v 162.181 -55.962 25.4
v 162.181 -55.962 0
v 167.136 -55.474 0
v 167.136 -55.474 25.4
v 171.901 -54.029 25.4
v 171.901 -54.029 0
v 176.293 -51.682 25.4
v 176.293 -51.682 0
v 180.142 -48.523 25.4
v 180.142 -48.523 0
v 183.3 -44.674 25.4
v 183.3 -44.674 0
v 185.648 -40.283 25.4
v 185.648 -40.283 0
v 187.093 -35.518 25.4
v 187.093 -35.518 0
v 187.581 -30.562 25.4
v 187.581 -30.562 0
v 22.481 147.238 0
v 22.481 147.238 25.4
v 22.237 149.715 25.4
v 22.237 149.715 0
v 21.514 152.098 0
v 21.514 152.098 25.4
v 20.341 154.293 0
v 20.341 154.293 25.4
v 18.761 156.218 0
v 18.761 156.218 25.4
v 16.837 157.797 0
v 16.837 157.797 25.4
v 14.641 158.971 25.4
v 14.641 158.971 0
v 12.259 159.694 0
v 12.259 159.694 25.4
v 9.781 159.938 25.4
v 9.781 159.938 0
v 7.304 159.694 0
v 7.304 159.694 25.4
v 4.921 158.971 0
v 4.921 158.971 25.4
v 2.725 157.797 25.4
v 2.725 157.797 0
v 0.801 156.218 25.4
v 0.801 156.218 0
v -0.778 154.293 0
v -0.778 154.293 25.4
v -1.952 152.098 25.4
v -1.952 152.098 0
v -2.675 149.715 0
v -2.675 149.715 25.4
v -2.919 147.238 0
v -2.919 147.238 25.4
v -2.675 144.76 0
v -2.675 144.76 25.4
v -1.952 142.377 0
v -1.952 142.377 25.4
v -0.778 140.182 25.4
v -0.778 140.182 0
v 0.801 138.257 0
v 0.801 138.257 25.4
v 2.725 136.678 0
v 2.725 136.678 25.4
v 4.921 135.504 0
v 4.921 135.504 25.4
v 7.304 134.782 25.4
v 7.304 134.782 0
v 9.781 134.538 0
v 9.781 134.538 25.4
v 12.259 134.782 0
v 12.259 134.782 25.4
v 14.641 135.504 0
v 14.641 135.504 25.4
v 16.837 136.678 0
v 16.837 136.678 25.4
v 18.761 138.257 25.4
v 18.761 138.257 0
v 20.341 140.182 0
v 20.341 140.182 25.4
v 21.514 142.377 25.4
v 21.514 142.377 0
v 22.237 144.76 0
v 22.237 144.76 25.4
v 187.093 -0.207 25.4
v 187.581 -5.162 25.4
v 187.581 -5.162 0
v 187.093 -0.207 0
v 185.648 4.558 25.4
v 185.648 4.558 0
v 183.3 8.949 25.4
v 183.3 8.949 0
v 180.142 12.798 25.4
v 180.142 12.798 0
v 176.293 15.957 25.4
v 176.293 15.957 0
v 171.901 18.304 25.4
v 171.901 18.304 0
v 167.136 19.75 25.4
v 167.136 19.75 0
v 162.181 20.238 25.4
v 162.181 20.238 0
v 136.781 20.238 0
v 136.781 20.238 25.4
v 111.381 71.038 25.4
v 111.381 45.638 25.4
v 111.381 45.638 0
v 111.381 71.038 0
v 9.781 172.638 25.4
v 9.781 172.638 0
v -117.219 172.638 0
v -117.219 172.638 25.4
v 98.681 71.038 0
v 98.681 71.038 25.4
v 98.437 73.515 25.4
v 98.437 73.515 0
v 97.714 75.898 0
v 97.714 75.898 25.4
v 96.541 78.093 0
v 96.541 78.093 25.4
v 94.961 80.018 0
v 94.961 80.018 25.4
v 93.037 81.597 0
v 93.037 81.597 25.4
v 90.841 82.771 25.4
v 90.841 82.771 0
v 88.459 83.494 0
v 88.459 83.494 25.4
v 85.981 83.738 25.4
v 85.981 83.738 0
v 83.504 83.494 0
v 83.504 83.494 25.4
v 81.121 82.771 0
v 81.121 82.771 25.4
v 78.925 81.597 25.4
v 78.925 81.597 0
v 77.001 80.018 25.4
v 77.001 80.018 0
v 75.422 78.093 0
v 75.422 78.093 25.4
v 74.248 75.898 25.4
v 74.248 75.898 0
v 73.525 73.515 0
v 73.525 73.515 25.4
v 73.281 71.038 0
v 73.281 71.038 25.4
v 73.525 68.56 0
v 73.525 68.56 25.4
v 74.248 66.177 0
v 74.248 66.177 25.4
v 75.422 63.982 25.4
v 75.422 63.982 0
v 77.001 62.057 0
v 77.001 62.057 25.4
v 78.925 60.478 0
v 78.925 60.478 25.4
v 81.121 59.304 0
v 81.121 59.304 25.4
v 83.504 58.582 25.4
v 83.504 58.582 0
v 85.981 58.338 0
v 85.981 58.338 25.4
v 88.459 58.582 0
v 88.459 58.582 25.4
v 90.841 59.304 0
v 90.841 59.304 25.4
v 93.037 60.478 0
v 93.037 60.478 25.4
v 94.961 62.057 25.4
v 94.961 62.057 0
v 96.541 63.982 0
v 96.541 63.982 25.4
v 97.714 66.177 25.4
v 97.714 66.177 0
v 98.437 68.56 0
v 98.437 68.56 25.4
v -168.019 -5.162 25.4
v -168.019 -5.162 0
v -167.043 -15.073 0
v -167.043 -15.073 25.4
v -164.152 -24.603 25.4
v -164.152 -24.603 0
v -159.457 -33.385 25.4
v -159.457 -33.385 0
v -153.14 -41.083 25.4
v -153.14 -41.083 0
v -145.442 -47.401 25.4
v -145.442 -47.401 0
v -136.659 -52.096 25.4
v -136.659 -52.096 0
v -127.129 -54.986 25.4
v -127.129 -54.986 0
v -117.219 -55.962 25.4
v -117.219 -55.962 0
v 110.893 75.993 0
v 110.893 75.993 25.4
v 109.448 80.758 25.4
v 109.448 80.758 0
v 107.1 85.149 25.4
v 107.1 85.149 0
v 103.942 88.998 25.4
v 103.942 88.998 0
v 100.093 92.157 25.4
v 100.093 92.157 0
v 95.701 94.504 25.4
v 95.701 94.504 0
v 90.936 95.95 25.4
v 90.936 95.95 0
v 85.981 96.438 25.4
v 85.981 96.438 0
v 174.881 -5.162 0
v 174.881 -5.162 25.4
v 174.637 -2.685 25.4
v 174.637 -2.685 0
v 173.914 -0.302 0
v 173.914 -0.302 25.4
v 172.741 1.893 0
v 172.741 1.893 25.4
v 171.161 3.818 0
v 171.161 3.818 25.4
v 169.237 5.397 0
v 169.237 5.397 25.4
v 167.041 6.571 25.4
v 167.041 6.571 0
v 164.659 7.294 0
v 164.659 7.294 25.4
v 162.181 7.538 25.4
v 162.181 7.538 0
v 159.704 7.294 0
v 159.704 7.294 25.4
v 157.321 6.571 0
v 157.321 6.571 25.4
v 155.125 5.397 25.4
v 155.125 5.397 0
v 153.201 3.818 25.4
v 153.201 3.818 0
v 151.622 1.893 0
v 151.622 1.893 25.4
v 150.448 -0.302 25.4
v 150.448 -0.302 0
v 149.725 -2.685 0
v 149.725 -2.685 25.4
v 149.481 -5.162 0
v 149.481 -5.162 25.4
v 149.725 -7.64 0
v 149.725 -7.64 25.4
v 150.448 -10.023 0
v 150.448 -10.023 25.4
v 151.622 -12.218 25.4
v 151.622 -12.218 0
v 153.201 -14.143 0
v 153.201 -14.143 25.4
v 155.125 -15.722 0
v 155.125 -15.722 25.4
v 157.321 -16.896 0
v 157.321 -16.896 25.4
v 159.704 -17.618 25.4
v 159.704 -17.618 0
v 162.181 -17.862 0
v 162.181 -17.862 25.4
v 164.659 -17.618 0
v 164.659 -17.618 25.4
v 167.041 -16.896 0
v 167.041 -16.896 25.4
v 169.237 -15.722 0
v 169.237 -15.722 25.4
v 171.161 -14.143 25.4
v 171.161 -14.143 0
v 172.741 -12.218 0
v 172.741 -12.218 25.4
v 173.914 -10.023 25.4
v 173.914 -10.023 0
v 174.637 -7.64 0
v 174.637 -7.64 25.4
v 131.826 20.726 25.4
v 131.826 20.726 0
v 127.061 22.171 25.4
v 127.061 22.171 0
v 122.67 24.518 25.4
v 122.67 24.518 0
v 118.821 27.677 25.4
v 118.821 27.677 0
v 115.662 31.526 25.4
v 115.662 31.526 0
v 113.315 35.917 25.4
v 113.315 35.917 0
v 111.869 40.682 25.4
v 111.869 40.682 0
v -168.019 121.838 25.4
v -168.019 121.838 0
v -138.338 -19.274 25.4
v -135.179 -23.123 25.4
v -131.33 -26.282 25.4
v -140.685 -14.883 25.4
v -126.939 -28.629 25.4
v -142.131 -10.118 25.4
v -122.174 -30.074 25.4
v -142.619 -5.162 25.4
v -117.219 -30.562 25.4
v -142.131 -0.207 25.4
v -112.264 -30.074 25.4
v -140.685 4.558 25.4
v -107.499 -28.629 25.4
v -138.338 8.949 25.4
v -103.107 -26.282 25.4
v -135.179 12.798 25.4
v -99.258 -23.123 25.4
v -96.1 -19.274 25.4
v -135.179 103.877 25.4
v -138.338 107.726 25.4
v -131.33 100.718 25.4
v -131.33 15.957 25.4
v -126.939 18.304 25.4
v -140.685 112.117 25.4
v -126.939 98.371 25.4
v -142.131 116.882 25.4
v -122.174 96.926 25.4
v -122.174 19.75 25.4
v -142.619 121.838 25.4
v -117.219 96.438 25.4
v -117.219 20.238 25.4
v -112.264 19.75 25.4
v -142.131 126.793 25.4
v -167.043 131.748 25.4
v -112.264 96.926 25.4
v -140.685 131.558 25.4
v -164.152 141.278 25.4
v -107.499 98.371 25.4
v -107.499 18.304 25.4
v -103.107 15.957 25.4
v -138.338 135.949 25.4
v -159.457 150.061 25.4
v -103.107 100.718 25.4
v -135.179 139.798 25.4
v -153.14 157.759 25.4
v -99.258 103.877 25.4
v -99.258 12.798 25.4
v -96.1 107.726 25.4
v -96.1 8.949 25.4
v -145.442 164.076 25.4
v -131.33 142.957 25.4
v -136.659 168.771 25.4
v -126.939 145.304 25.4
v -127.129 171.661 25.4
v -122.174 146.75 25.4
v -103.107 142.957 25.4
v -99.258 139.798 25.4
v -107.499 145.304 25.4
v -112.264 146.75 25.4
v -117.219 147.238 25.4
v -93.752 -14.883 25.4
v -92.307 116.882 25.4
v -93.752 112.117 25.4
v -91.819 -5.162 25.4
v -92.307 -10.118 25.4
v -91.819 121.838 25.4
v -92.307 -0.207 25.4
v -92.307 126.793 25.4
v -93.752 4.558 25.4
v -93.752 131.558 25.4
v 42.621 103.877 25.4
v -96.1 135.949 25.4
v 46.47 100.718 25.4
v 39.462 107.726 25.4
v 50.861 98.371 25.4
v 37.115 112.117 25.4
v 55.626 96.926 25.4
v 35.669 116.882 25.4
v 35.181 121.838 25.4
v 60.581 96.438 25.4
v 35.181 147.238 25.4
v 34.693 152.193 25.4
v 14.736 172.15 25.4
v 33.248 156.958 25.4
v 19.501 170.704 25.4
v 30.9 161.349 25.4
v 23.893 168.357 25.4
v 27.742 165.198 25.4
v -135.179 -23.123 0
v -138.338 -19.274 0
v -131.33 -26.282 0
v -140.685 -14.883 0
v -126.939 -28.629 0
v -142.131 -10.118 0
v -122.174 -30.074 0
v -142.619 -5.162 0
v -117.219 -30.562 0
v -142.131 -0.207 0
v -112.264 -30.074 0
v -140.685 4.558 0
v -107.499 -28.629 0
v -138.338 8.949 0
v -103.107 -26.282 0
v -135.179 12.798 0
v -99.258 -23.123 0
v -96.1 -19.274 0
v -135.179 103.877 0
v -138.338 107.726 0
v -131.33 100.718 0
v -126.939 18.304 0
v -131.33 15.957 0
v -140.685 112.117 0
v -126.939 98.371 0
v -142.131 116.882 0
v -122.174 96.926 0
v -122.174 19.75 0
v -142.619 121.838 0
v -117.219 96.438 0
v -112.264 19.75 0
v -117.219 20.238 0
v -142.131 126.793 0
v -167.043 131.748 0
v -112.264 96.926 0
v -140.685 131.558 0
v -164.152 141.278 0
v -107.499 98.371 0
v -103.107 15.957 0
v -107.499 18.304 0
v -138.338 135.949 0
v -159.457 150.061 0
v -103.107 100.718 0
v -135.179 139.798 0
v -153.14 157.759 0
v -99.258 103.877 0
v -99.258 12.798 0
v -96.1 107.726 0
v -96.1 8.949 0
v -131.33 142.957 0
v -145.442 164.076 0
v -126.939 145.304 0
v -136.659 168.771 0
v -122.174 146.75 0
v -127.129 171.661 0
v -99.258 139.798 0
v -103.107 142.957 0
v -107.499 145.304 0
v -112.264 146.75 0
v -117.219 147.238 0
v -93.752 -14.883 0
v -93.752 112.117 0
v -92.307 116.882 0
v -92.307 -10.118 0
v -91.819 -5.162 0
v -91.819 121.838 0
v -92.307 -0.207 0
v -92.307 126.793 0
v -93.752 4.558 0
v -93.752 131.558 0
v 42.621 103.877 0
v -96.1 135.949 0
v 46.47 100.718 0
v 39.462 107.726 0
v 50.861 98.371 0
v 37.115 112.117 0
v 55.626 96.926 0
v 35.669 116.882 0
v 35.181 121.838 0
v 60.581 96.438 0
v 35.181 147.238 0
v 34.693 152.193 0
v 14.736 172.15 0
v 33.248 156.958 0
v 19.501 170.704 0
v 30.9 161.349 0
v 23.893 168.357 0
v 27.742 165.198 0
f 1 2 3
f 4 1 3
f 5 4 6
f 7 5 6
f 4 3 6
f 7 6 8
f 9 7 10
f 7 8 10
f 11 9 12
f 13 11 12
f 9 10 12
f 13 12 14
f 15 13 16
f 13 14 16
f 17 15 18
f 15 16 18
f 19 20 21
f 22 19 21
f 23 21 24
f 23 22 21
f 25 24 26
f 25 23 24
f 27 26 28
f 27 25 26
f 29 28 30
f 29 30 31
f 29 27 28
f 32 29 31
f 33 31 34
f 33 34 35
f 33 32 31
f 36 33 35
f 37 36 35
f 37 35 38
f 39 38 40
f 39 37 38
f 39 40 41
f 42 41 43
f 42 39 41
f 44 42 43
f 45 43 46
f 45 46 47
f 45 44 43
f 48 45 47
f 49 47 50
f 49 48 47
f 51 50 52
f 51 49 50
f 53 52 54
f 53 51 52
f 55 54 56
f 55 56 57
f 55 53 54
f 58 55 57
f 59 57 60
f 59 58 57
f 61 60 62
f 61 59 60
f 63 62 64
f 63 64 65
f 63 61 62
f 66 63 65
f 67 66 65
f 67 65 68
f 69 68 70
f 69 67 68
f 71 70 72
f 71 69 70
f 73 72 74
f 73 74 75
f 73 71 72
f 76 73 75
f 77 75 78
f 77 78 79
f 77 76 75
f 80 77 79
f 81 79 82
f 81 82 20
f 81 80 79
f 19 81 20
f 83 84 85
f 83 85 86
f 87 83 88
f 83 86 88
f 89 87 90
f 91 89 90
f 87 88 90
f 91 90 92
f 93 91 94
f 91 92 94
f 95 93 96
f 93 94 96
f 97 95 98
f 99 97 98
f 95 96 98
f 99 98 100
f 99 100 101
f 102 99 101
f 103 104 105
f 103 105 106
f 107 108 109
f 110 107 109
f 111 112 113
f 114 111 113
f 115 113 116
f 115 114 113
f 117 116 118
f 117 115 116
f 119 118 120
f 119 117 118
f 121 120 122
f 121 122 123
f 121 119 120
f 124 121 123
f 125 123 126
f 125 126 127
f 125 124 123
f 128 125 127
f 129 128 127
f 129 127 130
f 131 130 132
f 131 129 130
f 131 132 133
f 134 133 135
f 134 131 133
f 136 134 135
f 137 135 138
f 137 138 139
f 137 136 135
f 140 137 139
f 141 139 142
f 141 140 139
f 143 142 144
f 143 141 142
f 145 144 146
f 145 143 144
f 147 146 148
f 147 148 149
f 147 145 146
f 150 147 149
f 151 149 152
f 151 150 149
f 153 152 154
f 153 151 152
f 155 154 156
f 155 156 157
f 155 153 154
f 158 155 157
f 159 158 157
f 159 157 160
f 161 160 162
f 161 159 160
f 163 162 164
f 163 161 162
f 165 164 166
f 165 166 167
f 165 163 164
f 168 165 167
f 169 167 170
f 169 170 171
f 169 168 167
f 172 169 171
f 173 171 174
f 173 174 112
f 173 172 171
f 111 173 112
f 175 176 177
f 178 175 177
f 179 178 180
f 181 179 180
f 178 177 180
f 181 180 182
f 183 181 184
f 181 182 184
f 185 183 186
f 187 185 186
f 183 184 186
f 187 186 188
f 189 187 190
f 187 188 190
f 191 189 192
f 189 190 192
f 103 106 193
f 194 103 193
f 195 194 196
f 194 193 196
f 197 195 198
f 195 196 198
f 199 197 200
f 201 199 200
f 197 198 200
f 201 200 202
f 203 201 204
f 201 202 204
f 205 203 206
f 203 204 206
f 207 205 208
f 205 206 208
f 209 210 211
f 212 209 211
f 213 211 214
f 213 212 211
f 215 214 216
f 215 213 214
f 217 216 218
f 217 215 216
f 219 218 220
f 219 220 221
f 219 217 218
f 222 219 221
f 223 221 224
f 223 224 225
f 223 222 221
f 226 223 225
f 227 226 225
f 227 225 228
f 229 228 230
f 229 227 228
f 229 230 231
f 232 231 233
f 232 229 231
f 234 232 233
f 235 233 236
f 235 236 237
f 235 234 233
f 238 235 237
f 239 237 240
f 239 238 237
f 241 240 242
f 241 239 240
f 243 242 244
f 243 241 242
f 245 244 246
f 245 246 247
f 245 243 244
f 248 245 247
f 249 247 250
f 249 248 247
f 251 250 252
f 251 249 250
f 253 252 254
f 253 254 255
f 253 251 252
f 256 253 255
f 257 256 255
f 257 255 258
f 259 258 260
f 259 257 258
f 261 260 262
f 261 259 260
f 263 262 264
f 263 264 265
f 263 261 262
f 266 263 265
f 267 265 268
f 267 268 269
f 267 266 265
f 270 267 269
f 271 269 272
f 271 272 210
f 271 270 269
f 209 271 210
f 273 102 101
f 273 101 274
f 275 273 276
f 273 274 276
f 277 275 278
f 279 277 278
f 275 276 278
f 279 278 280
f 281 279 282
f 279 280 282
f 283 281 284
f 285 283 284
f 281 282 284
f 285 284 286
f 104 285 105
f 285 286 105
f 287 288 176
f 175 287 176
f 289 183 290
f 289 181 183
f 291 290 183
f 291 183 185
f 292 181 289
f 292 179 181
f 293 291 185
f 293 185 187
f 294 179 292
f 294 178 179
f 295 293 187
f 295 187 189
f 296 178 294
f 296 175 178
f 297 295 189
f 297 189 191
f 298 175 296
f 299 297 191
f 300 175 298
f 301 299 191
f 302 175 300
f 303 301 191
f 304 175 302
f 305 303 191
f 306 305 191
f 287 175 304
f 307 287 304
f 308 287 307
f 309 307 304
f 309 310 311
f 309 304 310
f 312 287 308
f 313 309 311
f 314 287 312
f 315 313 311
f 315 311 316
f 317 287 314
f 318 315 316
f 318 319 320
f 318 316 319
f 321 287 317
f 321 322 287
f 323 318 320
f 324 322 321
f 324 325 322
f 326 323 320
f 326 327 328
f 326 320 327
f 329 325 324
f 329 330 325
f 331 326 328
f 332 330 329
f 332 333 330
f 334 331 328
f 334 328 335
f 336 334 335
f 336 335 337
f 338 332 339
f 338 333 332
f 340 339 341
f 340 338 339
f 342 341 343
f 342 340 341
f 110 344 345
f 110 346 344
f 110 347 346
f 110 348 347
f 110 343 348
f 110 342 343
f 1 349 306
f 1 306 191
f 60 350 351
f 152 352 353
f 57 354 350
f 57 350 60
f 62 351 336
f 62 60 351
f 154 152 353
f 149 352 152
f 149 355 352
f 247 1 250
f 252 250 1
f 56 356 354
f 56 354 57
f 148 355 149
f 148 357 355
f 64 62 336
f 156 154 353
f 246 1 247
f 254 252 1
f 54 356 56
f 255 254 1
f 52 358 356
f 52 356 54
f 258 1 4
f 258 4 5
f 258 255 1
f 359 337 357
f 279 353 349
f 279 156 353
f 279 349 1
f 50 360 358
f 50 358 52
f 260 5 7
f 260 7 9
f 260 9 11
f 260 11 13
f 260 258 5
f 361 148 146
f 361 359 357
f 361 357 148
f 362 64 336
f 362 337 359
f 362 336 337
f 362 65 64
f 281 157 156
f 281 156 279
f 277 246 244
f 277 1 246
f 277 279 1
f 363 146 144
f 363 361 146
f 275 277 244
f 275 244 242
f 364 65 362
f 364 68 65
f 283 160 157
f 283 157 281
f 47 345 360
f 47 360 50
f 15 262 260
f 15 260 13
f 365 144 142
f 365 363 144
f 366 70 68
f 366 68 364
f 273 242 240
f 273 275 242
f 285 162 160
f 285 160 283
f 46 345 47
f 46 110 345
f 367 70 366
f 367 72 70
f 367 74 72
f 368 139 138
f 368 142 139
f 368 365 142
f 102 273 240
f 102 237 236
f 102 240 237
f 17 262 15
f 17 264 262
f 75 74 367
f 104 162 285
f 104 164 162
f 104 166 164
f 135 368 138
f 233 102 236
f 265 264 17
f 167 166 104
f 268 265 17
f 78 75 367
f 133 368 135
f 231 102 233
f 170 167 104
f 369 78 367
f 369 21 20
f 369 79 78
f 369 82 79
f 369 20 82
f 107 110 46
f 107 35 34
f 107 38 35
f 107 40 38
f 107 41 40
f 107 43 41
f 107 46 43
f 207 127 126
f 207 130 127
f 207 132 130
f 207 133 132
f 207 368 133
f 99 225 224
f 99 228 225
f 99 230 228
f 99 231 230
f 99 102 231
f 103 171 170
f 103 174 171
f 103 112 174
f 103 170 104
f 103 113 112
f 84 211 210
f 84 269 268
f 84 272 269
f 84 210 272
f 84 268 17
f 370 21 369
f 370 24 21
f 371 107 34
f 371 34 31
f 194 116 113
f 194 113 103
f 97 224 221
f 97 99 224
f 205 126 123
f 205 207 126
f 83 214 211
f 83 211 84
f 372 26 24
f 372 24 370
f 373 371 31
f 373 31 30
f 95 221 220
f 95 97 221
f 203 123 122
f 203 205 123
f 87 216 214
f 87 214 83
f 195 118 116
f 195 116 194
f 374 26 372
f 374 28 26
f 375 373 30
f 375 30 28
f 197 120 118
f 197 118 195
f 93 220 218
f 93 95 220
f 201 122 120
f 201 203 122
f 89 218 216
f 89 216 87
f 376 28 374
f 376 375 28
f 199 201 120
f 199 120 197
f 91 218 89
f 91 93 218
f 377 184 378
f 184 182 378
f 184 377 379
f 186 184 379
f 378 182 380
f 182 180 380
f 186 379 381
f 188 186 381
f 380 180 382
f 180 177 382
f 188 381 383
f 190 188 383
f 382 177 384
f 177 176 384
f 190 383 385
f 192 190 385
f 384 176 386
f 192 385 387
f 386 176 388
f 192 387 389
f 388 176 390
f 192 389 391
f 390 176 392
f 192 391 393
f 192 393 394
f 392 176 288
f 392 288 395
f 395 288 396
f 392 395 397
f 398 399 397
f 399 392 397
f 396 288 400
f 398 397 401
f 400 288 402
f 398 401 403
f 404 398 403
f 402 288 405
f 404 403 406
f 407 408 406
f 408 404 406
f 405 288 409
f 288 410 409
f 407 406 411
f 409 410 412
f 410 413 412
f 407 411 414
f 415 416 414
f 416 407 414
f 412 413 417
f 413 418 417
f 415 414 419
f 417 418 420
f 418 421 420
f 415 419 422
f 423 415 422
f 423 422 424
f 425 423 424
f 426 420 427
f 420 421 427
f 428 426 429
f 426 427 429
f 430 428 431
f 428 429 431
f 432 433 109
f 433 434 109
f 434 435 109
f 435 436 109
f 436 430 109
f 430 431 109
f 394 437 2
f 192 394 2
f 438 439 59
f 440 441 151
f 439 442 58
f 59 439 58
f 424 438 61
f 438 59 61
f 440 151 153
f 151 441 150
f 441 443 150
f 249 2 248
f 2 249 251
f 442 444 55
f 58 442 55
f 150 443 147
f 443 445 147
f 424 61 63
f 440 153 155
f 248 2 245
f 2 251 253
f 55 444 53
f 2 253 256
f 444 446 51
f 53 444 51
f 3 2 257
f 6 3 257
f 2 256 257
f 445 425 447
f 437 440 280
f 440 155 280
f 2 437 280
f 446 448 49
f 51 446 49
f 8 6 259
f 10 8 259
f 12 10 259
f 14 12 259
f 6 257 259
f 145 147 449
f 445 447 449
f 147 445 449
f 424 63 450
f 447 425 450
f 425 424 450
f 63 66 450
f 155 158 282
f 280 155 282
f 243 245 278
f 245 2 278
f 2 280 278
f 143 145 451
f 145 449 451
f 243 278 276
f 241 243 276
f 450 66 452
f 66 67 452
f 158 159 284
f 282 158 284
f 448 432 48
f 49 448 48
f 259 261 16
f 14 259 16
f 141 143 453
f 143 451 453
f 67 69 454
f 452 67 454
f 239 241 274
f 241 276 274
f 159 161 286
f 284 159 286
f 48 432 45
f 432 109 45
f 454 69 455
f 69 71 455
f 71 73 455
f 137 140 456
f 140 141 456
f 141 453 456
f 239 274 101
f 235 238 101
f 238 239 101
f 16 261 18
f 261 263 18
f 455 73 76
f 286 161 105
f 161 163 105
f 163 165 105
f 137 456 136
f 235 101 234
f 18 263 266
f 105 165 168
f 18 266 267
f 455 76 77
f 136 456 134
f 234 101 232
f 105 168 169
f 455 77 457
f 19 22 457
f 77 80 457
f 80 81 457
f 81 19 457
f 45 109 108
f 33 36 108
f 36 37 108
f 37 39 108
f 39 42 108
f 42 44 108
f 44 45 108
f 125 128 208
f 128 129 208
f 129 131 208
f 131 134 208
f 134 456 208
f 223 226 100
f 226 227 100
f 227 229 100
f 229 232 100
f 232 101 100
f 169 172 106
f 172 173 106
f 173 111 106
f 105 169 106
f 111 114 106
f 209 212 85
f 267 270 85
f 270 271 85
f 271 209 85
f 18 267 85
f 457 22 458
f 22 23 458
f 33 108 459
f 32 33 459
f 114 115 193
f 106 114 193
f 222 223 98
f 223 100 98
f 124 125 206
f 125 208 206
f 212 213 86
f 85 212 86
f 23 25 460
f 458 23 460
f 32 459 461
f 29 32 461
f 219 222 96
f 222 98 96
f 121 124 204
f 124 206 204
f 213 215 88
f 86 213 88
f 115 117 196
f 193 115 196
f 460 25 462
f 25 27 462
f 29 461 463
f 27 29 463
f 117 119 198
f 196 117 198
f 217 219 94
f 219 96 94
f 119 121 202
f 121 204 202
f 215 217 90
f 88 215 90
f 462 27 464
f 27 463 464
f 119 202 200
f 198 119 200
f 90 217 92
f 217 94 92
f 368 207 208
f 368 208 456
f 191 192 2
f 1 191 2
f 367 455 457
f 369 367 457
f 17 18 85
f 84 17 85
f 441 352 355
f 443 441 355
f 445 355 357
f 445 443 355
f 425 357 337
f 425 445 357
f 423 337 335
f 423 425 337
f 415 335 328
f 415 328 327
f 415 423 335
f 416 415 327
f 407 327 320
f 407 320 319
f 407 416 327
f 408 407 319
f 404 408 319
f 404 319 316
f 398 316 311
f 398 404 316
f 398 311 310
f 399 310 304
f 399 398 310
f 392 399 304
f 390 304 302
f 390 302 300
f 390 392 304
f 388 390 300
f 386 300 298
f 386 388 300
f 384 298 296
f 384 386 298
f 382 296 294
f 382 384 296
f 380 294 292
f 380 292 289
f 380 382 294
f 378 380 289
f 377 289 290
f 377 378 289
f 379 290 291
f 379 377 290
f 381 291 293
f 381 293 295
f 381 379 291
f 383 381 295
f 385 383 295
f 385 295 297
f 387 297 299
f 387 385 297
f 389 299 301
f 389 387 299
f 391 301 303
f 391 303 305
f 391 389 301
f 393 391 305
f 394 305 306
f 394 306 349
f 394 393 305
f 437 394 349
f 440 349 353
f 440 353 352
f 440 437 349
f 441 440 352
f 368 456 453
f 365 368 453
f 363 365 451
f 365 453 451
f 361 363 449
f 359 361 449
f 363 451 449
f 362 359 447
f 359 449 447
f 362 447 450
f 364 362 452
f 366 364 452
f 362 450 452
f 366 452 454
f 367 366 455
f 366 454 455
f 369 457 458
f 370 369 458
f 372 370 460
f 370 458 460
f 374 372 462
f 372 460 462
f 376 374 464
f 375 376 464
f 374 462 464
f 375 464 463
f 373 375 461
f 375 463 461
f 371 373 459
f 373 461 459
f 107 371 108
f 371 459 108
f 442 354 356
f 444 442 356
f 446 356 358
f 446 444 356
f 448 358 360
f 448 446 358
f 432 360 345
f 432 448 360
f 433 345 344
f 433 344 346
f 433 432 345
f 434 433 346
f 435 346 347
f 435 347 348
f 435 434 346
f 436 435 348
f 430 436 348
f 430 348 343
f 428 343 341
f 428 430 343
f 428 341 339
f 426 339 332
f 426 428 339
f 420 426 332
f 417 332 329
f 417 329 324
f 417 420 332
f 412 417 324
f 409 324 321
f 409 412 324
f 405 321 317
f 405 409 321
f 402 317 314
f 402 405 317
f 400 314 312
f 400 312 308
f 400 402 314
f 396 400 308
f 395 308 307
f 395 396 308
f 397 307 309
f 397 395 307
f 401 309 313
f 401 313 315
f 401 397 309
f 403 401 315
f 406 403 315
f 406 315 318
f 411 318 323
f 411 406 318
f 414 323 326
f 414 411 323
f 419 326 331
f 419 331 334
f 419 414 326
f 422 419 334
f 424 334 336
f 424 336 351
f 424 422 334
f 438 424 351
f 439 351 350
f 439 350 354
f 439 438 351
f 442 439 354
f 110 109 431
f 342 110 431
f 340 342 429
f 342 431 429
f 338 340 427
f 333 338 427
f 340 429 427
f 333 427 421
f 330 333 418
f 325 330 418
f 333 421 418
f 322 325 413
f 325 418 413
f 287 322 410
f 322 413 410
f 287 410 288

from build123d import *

# Parameters (mm, degrees)
F0_R     = 25.4
F0_R_2   = 12.7
F1_DEPTH = 25.4


with BuildPart() as f1:
    # F0 (on Top) → F1 (new body)
    with BuildSketch(Plane.XY):
        with BuildLine():
            Line((-117.218833, -55.96244), (162.181167, -55.96244))
            ThreePointArc((162.181167, -55.96244), (180.141679, -48.522952), (187.581167, -30.56244))
            Line((187.581167, -30.56244), (187.581167, -5.16244))
            ThreePointArc((187.581167, -5.16244), (180.141679, 12.798073), (162.181167, 20.23756))
            Line((162.181167, 20.23756), (136.781167, 20.23756))
            ThreePointArc((136.781167, 20.23756), (118.820655, 27.677048), (111.381167, 45.63756))
            Line((111.381167, 45.63756), (111.381167, 71.03756))
            ThreePointArc((111.381167, 71.03756), (103.941679, 88.998073), (85.981167, 96.43756))
            Line((85.981167, 96.43756), (60.581167, 96.43756))
            ThreePointArc((60.581167, 96.43756), (42.620655, 103.877048), (35.181167, 121.83756))
            Line((35.181167, 121.83756), (35.181167, 147.23756))
            ThreePointArc((35.181167, 147.23756), (27.741679, 165.198073), (9.781167, 172.63756))
            Line((9.781167, 172.63756), (-117.218833, 172.63756))
            ThreePointArc((-117.218833, 172.63756), (-153.139857, 157.758585), (-168.018833, 121.83756))
            Line((-168.018833, 121.83756), (-168.018833, -5.16244))
            ThreePointArc((-168.018833, -5.16244), (-153.139857, -41.083464), (-117.218833, -55.96244))
        make_face()
        with Locations((-117.218833, -5.16244)):
            Circle(F0_R, mode=Mode.SUBTRACT)
        with Locations((162.181167, -5.16244)):
            Circle(F0_R_2, mode=Mode.SUBTRACT)
        with Locations((-117.218833, 121.83756)):
            Circle(F0_R, mode=Mode.SUBTRACT)
        with Locations((9.781167, 147.23756)):
            Circle(F0_R_2, mode=Mode.SUBTRACT)
        with Locations((85.981167, 71.03756)):
            Circle(F0_R_2, mode=Mode.SUBTRACT)
    extrude(amount=F1_DEPTH)


solid = f1.part
